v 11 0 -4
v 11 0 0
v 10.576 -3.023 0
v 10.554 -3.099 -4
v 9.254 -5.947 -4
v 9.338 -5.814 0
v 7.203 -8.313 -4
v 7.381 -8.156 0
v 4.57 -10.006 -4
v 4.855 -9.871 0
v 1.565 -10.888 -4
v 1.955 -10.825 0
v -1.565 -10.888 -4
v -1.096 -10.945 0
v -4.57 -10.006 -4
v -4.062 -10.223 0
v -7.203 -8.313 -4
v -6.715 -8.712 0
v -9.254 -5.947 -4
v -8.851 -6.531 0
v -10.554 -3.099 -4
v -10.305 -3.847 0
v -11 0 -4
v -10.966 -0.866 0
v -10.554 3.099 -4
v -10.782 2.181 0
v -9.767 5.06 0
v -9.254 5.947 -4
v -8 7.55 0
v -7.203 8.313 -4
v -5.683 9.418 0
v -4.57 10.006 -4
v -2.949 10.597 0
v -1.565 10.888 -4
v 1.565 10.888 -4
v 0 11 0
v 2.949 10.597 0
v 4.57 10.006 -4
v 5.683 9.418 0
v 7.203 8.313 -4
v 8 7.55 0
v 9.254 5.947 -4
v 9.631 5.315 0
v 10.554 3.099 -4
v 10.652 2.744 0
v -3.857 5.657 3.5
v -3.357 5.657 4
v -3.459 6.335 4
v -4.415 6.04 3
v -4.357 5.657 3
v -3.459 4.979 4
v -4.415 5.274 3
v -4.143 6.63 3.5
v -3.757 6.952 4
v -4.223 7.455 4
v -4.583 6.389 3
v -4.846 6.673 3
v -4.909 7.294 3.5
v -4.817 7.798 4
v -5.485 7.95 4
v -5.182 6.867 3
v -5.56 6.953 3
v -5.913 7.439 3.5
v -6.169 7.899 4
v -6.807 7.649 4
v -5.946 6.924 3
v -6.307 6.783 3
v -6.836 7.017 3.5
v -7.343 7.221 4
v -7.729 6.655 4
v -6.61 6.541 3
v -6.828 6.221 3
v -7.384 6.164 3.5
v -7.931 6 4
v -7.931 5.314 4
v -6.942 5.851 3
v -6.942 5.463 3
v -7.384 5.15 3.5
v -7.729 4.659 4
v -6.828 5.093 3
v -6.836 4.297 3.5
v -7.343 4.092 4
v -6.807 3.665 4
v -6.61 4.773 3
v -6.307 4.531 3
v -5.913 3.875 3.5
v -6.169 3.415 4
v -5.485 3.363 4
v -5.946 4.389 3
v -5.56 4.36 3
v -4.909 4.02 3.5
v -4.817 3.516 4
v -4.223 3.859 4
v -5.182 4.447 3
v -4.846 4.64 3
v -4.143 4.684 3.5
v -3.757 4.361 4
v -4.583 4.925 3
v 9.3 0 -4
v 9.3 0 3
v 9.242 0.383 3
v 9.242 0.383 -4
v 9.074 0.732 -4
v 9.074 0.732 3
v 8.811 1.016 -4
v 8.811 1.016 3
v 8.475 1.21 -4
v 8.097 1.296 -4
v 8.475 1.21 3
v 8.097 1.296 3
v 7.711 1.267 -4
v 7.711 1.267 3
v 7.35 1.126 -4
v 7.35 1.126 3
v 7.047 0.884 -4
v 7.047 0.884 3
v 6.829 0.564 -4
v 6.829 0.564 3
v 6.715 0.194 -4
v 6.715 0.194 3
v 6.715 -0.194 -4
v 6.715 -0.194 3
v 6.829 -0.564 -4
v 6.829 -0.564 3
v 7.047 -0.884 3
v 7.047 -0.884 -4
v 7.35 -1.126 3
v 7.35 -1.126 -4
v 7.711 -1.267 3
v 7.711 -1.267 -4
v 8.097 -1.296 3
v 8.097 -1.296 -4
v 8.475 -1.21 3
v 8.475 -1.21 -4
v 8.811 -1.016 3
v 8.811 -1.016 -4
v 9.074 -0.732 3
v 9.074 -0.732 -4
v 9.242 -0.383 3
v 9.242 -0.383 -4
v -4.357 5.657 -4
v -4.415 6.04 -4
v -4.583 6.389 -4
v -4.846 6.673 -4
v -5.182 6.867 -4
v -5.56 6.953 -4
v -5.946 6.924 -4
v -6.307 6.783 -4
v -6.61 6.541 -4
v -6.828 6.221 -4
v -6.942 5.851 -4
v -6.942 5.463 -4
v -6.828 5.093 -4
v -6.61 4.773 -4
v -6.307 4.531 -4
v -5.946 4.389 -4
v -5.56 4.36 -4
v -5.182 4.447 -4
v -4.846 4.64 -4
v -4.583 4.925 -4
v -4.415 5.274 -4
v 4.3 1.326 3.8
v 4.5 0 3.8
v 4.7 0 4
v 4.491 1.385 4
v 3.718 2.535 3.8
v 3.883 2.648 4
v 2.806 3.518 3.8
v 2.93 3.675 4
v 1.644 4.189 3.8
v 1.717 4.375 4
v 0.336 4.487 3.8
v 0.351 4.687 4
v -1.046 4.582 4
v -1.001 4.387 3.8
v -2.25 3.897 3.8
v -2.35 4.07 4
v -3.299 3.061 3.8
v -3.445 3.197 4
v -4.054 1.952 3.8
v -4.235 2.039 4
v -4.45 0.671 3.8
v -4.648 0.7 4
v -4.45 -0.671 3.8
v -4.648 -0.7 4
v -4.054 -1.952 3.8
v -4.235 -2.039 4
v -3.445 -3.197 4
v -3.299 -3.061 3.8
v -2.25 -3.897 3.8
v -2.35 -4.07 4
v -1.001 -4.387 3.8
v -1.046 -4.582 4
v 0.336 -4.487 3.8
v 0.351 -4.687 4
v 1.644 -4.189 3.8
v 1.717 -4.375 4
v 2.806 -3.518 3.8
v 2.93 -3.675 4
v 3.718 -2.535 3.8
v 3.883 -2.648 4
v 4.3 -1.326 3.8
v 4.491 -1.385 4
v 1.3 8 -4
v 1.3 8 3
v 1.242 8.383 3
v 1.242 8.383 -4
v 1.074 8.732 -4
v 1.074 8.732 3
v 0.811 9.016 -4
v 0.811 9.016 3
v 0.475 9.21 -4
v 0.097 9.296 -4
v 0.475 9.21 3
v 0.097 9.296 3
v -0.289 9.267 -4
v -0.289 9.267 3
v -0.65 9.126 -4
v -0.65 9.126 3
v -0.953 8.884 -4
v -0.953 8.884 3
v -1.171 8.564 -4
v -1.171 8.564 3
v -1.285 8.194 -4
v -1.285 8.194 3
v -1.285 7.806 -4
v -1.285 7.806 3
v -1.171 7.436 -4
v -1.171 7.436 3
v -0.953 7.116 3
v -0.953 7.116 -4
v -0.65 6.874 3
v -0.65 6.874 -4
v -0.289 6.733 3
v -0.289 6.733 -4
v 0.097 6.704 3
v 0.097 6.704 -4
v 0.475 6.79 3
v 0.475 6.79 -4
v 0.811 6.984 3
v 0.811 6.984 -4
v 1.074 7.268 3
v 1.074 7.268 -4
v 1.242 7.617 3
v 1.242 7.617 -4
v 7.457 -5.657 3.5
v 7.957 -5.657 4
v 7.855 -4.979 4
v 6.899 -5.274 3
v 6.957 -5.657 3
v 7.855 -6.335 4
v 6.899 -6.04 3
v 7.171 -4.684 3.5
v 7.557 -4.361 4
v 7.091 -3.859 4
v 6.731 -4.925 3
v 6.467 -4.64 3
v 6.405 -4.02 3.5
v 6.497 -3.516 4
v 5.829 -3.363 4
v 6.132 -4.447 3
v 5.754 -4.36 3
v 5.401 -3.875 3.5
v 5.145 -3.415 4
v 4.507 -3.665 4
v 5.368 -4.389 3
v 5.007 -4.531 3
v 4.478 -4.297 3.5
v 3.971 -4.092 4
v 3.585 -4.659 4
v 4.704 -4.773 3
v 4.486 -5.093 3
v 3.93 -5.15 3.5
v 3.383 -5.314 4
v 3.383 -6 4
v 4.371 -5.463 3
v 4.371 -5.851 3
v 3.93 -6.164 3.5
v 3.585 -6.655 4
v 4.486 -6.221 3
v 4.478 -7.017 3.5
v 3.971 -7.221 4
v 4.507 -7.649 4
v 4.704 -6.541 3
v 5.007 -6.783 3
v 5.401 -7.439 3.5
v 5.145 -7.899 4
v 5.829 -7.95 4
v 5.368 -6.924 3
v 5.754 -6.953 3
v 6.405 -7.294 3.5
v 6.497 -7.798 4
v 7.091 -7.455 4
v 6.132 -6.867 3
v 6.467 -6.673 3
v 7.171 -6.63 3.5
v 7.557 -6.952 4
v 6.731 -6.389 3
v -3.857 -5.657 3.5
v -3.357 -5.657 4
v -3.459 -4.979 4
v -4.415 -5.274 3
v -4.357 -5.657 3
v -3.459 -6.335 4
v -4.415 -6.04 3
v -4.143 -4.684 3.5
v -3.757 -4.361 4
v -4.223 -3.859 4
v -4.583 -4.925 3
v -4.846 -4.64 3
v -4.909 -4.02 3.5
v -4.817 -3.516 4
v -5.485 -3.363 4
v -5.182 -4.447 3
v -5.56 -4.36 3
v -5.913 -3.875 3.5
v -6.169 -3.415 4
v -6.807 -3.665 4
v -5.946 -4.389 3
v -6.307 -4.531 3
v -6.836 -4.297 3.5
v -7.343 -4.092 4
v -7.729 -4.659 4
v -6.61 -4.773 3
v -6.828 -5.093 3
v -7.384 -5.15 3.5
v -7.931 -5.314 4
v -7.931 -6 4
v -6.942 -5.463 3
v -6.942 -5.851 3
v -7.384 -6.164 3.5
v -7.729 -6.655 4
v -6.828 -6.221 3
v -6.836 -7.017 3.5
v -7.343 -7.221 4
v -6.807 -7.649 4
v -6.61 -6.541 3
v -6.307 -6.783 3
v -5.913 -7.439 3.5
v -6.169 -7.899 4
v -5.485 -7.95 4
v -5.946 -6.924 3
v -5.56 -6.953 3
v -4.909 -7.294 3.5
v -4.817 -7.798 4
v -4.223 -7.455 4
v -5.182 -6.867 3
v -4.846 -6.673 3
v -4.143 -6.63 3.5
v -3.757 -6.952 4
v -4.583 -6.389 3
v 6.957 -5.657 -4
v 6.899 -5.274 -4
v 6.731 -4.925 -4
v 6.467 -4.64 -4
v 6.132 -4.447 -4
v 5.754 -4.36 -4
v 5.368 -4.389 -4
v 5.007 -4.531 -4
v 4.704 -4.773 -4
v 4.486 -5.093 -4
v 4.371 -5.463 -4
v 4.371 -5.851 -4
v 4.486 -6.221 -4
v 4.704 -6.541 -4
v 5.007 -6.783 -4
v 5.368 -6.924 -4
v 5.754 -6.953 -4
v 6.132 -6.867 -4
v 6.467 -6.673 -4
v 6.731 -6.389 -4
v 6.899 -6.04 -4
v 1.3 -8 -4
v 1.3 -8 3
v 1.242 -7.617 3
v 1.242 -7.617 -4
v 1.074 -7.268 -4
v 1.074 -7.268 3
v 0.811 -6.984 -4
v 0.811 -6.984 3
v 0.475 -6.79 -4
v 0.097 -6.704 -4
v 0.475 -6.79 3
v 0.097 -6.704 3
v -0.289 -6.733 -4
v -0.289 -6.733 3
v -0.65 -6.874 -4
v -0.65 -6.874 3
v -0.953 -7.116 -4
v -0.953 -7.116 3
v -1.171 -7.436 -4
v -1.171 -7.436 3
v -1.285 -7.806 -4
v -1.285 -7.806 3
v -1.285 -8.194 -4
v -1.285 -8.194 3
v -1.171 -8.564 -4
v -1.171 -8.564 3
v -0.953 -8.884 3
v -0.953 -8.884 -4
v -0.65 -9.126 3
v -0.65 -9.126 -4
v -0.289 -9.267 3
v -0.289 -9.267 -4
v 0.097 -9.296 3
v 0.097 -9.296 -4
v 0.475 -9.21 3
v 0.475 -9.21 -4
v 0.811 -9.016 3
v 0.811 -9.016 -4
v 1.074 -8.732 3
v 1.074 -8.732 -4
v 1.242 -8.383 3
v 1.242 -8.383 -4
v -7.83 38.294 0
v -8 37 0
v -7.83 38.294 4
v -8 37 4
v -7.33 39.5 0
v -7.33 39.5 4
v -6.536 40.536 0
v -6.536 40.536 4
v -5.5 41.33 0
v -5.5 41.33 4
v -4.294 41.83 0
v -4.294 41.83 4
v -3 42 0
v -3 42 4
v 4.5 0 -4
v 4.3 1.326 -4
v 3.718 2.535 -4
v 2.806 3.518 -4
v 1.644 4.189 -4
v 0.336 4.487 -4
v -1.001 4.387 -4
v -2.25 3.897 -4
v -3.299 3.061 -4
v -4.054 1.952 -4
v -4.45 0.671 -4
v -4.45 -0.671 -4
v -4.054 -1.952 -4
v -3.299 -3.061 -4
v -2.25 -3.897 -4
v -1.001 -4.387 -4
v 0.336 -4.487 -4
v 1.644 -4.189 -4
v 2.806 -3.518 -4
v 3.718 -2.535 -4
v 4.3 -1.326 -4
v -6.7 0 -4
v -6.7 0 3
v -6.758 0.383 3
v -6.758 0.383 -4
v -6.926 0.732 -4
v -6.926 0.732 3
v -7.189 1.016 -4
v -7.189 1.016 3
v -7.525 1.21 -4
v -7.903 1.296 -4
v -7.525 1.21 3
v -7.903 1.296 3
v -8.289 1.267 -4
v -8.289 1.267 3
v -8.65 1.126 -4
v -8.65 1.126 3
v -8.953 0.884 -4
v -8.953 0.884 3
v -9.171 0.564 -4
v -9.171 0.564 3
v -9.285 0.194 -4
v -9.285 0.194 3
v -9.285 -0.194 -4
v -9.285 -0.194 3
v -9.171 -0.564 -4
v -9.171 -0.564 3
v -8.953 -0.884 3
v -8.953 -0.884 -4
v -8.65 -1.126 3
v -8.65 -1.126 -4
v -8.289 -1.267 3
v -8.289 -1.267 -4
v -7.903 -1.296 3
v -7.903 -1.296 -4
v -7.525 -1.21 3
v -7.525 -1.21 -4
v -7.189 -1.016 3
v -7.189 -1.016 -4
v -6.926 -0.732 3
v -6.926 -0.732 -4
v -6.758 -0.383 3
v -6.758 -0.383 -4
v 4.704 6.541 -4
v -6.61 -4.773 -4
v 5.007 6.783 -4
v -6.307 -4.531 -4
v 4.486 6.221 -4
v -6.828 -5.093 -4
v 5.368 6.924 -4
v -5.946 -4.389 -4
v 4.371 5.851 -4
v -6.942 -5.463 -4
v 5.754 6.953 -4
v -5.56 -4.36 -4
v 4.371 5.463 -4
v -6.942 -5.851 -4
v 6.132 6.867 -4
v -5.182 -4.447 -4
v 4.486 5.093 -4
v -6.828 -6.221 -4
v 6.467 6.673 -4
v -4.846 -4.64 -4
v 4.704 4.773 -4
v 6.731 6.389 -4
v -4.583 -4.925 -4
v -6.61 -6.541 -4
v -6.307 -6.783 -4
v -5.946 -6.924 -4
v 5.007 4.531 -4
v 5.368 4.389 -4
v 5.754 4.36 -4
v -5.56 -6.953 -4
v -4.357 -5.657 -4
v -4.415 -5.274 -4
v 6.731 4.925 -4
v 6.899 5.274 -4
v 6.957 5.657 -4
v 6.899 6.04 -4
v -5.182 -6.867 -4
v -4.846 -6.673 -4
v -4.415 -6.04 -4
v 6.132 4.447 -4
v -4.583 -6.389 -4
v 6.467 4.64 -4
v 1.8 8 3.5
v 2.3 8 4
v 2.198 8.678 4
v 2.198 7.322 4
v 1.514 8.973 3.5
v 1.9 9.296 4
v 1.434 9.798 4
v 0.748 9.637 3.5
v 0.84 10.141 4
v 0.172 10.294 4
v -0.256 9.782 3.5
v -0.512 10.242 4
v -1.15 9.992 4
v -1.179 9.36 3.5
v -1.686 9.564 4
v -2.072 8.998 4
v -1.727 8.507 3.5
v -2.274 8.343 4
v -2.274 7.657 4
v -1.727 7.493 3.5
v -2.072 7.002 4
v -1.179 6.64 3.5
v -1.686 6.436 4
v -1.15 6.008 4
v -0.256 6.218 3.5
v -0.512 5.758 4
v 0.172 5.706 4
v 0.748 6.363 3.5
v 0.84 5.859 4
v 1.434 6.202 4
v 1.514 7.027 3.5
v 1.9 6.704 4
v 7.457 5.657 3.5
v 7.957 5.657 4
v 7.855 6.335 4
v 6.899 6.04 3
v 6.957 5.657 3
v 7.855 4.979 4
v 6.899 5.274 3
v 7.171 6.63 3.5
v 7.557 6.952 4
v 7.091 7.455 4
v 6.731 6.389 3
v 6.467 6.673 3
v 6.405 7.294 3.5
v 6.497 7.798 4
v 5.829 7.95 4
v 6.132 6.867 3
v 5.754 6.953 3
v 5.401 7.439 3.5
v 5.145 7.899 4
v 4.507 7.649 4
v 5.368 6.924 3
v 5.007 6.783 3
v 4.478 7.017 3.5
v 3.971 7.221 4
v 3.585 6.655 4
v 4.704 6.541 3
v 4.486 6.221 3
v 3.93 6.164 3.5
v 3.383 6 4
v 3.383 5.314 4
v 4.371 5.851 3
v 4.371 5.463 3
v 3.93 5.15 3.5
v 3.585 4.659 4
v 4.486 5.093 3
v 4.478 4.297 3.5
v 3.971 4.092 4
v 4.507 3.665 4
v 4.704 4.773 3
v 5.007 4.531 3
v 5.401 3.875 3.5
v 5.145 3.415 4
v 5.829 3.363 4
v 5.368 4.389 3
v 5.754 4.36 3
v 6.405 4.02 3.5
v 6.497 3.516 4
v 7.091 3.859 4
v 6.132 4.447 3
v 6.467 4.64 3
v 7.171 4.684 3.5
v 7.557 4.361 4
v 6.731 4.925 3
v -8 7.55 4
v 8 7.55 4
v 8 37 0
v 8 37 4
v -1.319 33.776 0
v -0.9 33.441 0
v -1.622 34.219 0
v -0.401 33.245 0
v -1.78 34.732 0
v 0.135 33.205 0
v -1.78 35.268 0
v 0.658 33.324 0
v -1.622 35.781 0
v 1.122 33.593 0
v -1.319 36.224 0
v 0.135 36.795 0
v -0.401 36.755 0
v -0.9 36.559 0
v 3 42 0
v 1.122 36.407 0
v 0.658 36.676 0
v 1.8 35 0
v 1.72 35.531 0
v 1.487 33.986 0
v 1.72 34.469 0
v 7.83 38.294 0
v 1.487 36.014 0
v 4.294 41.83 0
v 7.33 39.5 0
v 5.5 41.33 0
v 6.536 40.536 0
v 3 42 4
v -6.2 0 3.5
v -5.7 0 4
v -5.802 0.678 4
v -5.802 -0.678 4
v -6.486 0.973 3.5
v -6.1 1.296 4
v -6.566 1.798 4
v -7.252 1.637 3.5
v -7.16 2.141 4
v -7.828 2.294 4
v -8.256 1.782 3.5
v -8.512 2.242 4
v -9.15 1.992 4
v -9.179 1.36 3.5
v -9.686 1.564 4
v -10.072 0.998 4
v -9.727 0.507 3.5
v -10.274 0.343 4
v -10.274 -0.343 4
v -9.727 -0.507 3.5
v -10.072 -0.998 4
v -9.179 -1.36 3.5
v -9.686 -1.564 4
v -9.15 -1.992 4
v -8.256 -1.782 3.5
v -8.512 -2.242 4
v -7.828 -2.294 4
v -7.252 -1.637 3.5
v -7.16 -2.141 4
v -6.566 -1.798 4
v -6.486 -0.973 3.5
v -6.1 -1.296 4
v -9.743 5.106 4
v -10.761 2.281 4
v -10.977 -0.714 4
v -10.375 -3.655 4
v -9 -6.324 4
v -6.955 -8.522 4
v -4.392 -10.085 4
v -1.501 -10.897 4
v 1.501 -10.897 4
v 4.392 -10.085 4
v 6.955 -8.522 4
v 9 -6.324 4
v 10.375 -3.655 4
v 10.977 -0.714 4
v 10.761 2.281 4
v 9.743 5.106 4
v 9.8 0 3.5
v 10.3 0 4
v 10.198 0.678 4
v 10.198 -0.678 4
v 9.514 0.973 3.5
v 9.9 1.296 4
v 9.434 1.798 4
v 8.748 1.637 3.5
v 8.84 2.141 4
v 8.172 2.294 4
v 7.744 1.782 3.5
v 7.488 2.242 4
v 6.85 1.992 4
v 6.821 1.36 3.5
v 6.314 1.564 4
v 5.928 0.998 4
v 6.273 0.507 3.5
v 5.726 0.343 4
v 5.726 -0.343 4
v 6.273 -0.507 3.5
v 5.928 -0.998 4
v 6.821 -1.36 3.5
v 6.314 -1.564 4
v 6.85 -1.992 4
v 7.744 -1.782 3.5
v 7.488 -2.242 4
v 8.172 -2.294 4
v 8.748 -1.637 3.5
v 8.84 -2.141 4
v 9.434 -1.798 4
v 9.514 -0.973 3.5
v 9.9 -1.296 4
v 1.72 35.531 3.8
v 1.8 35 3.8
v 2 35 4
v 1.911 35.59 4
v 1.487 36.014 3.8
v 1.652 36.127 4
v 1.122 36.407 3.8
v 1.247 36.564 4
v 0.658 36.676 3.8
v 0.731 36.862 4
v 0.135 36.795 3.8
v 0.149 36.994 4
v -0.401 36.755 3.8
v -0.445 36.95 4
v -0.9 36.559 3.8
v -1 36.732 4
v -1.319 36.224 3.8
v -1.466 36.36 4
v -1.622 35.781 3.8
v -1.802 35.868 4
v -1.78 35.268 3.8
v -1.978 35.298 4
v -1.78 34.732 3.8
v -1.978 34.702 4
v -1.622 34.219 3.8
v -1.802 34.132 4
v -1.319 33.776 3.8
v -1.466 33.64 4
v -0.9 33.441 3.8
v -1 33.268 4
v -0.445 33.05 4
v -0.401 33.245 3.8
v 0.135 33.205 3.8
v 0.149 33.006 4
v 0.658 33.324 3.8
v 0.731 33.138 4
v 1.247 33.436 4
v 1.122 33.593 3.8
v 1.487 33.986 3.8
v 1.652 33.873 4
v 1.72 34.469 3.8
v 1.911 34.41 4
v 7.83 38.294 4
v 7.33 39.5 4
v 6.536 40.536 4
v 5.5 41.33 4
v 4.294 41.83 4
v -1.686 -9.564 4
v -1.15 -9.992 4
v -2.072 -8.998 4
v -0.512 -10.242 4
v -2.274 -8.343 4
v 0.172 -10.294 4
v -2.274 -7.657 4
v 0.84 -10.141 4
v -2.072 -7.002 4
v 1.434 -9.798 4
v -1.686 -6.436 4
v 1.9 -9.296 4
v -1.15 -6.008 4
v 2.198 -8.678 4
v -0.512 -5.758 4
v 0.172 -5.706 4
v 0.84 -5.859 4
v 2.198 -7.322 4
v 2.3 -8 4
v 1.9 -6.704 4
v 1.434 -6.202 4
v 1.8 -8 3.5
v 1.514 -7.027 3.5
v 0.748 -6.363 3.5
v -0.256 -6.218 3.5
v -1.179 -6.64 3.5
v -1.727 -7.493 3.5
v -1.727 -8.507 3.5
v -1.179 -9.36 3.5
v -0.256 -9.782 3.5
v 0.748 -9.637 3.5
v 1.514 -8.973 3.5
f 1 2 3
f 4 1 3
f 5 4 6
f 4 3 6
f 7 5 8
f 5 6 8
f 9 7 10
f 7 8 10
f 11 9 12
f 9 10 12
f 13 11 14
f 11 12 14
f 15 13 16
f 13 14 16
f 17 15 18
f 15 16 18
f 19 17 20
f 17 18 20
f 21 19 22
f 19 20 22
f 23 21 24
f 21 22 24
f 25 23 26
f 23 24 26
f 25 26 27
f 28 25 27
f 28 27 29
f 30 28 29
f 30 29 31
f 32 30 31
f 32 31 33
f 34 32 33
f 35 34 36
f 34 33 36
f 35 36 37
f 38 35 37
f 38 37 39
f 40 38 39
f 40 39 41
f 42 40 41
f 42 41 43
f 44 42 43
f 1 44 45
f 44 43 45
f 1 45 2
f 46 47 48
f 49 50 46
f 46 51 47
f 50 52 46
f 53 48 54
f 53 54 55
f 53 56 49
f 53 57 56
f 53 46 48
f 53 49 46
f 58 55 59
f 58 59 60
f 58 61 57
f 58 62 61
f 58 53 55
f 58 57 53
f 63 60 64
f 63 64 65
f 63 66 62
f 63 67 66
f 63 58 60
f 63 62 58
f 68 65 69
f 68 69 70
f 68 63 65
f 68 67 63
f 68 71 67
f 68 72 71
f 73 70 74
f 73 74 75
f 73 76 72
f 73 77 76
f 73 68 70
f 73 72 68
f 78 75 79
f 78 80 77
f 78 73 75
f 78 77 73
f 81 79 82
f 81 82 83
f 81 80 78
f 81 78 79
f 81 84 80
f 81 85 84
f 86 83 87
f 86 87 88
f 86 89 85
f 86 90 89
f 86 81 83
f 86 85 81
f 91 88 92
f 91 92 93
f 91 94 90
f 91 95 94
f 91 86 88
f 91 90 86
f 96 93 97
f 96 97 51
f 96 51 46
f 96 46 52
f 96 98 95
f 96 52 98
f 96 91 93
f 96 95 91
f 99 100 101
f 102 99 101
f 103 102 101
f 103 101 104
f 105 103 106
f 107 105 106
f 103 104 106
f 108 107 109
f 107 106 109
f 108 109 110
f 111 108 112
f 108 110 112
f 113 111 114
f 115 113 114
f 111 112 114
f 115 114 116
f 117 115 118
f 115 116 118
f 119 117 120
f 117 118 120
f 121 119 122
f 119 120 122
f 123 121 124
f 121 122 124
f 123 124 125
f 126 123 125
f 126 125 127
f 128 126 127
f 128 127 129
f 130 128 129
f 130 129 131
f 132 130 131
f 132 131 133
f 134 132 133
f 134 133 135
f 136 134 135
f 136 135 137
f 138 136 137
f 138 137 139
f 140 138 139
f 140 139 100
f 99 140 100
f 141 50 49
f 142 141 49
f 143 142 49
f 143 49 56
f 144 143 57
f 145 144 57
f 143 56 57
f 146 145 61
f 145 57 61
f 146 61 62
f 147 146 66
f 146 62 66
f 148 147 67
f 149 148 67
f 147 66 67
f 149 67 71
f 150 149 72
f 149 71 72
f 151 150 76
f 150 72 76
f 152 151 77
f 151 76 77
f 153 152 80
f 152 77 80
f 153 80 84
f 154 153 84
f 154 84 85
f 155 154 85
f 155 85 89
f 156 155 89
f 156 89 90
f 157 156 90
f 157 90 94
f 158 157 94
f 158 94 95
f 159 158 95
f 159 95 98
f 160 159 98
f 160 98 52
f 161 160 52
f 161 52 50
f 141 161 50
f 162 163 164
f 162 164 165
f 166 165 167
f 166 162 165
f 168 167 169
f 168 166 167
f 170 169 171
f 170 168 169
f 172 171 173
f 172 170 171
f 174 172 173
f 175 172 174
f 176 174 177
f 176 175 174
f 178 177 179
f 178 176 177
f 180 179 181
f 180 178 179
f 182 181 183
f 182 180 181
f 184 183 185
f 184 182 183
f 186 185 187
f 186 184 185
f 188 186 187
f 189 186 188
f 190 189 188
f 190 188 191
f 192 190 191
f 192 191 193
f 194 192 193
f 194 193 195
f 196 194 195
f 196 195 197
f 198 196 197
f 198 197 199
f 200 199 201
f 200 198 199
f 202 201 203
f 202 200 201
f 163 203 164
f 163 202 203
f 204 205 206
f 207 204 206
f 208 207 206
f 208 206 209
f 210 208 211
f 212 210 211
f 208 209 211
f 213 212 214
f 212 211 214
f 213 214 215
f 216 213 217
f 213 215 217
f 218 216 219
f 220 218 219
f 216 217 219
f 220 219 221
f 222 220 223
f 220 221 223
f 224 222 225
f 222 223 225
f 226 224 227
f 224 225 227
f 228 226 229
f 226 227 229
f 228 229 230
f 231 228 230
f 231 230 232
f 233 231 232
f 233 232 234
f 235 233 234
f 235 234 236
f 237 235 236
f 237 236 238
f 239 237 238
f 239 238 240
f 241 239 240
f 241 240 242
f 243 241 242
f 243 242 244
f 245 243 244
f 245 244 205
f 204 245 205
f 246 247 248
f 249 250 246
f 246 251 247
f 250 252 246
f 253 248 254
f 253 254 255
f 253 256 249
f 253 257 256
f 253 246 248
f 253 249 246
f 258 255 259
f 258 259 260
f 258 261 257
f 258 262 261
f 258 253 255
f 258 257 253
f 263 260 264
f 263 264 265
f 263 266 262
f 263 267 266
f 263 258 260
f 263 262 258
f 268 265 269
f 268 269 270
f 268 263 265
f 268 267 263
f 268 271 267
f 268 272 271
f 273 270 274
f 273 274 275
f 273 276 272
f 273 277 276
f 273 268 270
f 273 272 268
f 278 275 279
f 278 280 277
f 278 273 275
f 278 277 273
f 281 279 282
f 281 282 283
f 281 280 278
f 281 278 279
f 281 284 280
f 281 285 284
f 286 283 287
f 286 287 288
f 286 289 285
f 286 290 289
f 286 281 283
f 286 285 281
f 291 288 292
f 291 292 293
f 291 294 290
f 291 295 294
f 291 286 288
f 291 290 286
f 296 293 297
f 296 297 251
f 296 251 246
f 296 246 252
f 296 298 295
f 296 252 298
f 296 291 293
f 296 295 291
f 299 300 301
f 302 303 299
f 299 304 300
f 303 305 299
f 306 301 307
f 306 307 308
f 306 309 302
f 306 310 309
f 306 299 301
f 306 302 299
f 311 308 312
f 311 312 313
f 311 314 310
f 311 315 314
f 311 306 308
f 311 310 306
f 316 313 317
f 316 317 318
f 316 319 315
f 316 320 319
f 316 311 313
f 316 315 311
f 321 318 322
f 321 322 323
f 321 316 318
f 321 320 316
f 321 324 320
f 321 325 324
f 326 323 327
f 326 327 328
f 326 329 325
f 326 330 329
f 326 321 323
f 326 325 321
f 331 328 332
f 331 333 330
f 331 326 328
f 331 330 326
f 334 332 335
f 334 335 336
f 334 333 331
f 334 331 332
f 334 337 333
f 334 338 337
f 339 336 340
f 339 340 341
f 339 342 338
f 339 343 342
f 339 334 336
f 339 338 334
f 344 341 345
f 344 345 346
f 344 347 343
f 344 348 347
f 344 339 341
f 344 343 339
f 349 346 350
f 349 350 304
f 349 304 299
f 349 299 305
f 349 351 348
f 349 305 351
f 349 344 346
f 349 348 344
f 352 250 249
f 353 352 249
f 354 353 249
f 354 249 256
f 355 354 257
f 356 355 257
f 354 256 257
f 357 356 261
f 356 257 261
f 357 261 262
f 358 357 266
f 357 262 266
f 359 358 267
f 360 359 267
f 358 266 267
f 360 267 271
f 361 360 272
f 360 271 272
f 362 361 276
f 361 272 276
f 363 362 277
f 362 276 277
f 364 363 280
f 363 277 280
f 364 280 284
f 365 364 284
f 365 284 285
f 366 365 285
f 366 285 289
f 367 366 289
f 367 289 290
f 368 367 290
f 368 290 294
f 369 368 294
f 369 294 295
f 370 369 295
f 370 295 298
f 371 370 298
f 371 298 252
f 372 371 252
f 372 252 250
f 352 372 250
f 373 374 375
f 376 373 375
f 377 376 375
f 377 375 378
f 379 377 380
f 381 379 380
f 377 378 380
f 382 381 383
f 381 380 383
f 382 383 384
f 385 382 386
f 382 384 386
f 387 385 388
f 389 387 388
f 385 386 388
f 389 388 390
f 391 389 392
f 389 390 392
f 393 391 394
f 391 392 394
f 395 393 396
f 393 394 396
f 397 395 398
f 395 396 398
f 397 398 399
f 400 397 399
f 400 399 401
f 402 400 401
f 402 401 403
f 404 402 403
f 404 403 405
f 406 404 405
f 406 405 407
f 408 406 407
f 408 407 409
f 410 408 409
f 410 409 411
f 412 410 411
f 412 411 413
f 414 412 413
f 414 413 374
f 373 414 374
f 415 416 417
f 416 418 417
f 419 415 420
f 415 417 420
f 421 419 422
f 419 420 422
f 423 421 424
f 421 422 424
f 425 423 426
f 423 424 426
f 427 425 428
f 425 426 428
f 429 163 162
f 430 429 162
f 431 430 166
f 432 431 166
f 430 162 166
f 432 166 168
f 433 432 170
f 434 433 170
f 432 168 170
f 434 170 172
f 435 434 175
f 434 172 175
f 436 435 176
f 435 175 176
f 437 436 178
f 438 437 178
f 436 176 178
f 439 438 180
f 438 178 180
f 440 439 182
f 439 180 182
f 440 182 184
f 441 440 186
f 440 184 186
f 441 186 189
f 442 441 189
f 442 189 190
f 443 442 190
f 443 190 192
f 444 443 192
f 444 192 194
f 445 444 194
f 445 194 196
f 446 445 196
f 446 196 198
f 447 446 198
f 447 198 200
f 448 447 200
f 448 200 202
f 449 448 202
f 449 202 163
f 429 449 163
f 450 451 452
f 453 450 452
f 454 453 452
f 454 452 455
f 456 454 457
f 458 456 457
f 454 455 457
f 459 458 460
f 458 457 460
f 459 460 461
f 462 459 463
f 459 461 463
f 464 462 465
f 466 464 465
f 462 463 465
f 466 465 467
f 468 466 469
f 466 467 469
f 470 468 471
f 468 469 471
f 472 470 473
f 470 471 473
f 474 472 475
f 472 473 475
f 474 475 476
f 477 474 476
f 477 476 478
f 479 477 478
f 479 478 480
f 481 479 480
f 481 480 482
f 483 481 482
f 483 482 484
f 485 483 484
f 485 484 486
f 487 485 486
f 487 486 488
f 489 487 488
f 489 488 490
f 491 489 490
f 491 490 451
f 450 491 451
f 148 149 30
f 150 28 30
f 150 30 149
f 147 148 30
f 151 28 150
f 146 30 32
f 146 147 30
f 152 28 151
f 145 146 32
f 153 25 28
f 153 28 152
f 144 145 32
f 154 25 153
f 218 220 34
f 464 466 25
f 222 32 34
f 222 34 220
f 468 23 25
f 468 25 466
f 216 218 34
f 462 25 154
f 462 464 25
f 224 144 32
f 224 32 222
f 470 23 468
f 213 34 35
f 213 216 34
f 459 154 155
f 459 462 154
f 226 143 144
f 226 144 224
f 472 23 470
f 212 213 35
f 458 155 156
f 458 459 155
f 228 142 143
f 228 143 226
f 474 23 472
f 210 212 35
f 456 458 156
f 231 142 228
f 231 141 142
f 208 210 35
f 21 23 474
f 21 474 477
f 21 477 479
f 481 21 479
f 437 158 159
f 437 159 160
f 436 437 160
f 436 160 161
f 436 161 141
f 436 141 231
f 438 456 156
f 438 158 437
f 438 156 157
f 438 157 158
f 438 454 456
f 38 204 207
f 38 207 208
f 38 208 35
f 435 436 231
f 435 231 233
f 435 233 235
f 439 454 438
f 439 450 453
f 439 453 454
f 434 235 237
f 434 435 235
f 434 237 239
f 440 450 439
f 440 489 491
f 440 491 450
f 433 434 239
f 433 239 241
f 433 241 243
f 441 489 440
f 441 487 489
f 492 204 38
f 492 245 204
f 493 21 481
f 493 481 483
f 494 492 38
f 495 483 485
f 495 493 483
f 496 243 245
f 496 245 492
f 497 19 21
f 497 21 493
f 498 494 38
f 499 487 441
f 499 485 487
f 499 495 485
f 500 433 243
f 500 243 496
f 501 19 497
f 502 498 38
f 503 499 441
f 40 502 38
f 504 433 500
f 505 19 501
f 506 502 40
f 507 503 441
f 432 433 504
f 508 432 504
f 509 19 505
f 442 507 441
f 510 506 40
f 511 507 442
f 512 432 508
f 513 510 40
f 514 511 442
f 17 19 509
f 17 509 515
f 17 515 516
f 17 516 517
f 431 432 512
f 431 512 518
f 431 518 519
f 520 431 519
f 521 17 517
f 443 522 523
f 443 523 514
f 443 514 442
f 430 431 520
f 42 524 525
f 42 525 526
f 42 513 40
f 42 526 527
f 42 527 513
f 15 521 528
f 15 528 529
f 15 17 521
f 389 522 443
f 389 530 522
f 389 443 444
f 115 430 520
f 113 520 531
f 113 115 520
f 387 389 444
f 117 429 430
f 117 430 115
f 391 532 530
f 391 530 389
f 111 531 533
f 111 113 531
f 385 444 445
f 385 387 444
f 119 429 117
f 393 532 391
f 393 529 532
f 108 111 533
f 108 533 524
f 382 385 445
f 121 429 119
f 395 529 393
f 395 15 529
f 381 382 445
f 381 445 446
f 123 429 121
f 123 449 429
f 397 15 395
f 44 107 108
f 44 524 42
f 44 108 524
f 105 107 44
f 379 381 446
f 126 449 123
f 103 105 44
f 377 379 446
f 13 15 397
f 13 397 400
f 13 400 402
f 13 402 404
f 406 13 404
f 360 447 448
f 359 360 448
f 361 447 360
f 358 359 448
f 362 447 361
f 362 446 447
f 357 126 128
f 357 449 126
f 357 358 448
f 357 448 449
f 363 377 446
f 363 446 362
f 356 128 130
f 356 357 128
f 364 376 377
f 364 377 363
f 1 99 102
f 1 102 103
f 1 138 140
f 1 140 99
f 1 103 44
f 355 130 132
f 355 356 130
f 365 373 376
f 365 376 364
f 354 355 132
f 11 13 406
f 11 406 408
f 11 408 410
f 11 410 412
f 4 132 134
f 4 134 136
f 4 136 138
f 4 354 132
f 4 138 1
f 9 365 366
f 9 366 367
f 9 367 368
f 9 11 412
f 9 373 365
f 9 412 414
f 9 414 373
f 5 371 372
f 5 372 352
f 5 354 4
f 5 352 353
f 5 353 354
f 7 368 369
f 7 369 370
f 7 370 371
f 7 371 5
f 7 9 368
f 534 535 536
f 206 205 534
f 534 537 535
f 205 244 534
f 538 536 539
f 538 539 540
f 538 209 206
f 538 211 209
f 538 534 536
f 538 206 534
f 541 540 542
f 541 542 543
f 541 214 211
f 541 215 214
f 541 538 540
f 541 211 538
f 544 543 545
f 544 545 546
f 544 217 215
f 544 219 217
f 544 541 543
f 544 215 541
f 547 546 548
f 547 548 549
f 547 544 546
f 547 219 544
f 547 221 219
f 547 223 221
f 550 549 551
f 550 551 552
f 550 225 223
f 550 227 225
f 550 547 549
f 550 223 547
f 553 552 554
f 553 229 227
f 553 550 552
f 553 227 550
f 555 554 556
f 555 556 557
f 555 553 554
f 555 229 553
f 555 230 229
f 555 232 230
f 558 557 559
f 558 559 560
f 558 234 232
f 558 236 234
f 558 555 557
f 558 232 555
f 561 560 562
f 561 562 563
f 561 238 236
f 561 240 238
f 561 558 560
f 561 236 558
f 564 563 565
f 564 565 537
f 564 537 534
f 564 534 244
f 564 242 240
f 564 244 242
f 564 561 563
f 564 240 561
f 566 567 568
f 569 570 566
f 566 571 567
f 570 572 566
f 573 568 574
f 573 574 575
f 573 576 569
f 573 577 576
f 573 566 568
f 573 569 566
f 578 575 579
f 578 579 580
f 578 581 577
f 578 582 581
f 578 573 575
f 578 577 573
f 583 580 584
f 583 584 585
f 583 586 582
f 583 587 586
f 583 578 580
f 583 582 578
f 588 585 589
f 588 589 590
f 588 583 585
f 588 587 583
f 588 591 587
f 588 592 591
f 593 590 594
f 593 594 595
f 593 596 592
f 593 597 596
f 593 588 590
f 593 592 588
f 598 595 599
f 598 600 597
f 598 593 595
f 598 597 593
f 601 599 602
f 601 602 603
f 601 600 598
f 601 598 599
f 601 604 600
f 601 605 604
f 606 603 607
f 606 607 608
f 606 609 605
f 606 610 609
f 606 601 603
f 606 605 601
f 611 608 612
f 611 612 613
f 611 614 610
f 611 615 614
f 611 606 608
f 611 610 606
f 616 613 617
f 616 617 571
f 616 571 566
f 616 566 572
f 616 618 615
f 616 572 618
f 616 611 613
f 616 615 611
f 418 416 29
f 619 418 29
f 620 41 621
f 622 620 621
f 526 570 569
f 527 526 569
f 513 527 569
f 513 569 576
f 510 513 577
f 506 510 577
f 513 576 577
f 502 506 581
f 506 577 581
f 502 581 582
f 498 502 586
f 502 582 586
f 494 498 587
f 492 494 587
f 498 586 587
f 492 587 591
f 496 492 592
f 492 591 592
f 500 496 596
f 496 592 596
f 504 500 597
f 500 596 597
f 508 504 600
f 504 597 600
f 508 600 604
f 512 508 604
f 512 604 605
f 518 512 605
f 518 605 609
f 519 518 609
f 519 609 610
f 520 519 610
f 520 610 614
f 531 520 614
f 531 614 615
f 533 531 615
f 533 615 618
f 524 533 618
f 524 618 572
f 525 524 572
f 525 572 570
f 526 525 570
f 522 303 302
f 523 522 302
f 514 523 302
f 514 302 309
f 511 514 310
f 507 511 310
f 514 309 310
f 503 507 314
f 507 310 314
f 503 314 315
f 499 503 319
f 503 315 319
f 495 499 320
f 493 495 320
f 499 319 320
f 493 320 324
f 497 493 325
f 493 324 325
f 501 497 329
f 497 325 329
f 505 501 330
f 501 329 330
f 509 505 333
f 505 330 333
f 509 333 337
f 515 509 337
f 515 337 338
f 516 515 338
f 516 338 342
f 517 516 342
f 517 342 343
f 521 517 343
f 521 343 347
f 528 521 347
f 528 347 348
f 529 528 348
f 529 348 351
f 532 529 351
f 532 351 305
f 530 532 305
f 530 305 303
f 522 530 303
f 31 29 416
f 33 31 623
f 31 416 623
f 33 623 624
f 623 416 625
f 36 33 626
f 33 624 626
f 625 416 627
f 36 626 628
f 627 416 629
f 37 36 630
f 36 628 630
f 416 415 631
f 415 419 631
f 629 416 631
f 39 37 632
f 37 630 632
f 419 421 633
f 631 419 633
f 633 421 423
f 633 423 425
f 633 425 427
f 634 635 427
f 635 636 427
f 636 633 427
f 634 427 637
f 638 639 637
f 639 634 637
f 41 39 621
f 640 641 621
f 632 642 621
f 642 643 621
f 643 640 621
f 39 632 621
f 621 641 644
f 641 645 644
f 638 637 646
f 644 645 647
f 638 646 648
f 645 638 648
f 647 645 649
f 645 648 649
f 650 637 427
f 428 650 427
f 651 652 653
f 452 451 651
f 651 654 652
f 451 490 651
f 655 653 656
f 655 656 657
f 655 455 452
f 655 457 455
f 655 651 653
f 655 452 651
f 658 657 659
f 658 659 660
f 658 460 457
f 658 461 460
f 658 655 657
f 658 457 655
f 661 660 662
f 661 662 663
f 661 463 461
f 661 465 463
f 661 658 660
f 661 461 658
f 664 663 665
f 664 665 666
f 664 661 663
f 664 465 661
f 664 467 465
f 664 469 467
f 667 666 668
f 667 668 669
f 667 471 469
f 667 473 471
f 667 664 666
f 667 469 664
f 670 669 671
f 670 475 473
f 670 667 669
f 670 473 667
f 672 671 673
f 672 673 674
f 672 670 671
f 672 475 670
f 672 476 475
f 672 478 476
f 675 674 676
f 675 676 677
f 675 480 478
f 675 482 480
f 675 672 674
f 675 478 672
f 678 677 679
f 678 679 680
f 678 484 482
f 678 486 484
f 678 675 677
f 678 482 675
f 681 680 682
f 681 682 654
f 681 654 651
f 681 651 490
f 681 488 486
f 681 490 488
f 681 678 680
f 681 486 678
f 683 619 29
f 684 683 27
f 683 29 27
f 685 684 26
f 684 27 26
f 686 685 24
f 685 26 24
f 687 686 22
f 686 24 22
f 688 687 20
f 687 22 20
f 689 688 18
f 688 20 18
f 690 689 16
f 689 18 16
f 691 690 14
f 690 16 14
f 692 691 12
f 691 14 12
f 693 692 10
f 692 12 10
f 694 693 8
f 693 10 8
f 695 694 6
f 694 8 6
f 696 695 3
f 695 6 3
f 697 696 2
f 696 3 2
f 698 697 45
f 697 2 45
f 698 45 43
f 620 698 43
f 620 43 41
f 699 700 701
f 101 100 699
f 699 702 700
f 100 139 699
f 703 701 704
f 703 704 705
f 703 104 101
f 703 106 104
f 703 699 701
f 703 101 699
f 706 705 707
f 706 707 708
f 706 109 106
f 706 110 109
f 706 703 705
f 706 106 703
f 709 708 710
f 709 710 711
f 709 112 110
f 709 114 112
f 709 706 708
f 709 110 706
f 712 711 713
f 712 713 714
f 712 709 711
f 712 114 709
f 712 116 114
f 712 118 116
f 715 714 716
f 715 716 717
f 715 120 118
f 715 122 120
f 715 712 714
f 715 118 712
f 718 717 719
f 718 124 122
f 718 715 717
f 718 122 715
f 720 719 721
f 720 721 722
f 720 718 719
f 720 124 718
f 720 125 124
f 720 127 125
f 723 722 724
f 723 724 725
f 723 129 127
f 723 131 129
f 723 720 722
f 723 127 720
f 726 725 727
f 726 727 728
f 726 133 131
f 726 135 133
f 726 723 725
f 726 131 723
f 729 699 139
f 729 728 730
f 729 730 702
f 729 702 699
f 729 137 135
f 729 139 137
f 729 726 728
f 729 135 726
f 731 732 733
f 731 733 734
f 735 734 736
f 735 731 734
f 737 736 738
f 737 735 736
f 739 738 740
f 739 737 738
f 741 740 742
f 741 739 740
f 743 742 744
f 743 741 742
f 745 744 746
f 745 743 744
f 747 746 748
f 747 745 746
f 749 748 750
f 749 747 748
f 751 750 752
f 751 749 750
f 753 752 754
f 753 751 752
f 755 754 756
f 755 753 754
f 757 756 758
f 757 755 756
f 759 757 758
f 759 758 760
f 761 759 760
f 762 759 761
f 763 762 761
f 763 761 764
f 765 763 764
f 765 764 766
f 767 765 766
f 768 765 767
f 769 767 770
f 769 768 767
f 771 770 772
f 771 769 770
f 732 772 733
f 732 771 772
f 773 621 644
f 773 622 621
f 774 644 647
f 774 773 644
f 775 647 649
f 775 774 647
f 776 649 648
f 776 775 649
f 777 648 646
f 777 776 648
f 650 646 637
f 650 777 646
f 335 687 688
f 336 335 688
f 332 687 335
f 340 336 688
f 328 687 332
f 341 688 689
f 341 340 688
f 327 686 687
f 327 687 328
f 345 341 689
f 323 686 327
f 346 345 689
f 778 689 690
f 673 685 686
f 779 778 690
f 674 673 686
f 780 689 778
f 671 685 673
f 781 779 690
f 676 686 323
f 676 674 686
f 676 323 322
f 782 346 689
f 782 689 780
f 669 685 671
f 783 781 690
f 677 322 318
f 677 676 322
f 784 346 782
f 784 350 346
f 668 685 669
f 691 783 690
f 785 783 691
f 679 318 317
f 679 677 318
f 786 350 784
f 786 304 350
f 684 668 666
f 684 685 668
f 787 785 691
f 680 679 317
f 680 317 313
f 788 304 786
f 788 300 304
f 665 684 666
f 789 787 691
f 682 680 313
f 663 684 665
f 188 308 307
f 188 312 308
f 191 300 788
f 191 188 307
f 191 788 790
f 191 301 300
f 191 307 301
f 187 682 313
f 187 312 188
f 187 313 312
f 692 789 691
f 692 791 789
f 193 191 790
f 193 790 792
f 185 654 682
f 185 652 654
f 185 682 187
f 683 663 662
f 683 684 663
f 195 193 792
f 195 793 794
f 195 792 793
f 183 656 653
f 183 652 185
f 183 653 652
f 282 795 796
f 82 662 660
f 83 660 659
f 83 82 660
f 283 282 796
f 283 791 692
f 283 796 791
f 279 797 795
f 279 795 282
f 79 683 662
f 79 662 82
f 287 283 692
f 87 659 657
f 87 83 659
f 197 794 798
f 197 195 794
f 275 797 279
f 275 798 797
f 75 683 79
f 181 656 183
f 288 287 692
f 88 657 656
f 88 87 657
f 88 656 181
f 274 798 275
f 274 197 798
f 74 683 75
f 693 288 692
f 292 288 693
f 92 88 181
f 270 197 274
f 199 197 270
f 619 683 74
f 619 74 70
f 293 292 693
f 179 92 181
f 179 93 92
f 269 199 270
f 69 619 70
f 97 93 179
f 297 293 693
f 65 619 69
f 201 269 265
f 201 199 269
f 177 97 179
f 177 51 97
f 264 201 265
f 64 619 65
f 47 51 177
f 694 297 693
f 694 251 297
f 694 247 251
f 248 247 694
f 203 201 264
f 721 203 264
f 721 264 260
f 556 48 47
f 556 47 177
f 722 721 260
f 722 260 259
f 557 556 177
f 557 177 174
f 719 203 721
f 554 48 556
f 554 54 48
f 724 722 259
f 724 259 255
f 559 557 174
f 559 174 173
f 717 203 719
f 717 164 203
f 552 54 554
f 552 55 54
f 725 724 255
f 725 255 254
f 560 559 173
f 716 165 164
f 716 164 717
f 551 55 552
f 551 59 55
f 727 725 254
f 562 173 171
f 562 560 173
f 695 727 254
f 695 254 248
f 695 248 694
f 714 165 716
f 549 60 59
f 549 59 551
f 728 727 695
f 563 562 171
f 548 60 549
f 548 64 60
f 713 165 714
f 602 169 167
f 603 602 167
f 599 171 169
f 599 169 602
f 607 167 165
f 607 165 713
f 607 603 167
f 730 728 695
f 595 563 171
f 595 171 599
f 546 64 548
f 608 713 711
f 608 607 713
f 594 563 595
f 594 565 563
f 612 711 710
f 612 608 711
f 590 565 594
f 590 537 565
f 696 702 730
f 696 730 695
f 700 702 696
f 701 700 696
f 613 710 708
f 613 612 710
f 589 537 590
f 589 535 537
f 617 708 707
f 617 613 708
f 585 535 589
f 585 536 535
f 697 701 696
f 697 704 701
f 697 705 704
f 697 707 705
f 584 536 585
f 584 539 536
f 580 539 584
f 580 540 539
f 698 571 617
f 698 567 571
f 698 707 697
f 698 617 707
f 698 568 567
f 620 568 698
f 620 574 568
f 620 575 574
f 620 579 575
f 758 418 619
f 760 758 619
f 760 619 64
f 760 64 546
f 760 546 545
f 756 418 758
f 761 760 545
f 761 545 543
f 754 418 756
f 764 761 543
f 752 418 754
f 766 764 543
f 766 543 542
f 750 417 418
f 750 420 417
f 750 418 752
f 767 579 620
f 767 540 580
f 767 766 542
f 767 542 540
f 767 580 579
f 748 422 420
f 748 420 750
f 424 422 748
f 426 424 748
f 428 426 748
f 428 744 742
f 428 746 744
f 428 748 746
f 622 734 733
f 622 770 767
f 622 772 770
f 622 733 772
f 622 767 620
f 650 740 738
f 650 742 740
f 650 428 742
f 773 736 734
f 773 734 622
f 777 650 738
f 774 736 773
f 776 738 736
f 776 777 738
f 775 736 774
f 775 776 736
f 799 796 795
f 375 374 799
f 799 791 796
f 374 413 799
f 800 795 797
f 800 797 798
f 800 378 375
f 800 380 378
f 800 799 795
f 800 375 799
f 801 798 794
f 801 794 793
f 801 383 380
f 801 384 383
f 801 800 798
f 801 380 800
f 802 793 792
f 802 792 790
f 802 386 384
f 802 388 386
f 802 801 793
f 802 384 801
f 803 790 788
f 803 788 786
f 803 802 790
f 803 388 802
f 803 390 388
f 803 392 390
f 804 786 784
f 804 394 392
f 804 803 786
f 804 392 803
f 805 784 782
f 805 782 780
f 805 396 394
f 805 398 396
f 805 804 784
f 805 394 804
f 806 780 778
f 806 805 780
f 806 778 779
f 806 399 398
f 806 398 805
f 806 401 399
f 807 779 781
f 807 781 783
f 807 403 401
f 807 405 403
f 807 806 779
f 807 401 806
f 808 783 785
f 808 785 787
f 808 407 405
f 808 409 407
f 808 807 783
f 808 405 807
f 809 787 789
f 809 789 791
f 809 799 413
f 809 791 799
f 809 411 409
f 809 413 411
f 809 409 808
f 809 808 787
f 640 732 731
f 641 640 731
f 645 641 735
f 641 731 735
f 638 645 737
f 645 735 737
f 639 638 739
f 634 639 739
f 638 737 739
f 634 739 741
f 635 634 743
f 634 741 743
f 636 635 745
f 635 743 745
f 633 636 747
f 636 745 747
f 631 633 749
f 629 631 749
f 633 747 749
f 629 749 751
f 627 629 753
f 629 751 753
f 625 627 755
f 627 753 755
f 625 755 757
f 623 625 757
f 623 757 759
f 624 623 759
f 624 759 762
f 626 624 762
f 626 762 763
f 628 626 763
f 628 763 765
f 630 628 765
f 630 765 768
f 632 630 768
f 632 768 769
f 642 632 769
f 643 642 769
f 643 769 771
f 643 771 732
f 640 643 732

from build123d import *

# Parameters (mm, degrees)
PAD_DEPTH       = 4
SKETCH003_R     = 1.8
POCKET_DEPTH    = 5
FILLET_R        = 5
SKETCH004_R     = 11
PAD001_DEPTH    = 4
SKETCH002_R     = 4.5
SKETCH002_R_2   = 1.3
POCKET001_DEPTH = 10
CHAMFER_SIZE    = 1
CHAMFER001_SIZE = 0.2


with BuildPart() as part:
    # Sketch → Pad (new body)
    with BuildSketch(Plane.XY):
        with BuildLine():
            ThreePointArc((-8, 7.549834), (0, -11), (8, 7.549834))
            Line((8, 7.549834), (8, 42))
            Line((8, 42), (-8, 42))
            Line((-8, 42), (-8, 7.549834))
        make_face()
    extrude(amount=PAD_DEPTH)

    # Sketch003 → Pocket (cut)
    with BuildSketch(Plane.XY.offset(4)):
        with Locations((0, 35)):
            Circle(SKETCH003_R)
    extrude(amount=-POCKET_DEPTH, mode=Mode.SUBTRACT)

    # Fillet
    fillet_edges = [part.edges().sort_by_distance(p)[0] for p in [
        (-8, 42, 2),
        (8, 42, 2),
    ]]
    fillet(fillet_edges, radius=FILLET_R)

    # Sketch004 → Pad001 (join)
    with BuildSketch(Plane(origin=(0, 0, 0), x_dir=(1, 0, 0), z_dir=(0, 0, -1))):
        Circle(SKETCH004_R)
    extrude(amount=PAD001_DEPTH)

    # Sketch002 (on Face5 of Pad001) → Pocket001 (cut)
    with BuildSketch(Plane.XY.offset(4)):
        Circle(SKETCH002_R)
        with Locations((0, 8)):
            Circle(SKETCH002_R_2)
        with Locations((5.656854, 5.656854)):
            Circle(SKETCH002_R_2)
        with Locations((8, 0)):
            Circle(SKETCH002_R_2)
        with Locations((5.656854, -5.656854)):
            Circle(SKETCH002_R_2)
        with Locations((0, -8)):
            Circle(SKETCH002_R_2)
        with Locations((-5.656854, -5.656854)):
            Circle(SKETCH002_R_2)
        with Locations((-8, 0)):
            Circle(SKETCH002_R_2)
        with Locations((-5.656854, 5.656854)):
            Circle(SKETCH002_R_2)
    extrude(amount=-POCKET001_DEPTH, mode=Mode.SUBTRACT)

    # Chamfer
    chamfer_edges = [part.edges().sort_by_distance(p)[0] for p in [
        (-6.956854, 5.656854, 4),
        (-1.3, 8, 4),
        (4.356854, 5.656854, 4),
        (6.7, 0, 4),
        (4.356854, -5.656854, 4),
        (-1.3, -8, 4),
        (-6.956854, -5.656854, 4),
        (-9.3, 0, 4),
    ]]
    chamfer(chamfer_edges, length=CHAMFER_SIZE)

    # Chamfer001
    chamfer001_edges = [part.edges().sort_by_distance(p)[0] for p in [
        (-1.8, 35, 4),
        (-4.5, 0, 4),
    ]]
    chamfer(chamfer001_edges, length=CHAMFER001_SIZE)


solid = part.part
